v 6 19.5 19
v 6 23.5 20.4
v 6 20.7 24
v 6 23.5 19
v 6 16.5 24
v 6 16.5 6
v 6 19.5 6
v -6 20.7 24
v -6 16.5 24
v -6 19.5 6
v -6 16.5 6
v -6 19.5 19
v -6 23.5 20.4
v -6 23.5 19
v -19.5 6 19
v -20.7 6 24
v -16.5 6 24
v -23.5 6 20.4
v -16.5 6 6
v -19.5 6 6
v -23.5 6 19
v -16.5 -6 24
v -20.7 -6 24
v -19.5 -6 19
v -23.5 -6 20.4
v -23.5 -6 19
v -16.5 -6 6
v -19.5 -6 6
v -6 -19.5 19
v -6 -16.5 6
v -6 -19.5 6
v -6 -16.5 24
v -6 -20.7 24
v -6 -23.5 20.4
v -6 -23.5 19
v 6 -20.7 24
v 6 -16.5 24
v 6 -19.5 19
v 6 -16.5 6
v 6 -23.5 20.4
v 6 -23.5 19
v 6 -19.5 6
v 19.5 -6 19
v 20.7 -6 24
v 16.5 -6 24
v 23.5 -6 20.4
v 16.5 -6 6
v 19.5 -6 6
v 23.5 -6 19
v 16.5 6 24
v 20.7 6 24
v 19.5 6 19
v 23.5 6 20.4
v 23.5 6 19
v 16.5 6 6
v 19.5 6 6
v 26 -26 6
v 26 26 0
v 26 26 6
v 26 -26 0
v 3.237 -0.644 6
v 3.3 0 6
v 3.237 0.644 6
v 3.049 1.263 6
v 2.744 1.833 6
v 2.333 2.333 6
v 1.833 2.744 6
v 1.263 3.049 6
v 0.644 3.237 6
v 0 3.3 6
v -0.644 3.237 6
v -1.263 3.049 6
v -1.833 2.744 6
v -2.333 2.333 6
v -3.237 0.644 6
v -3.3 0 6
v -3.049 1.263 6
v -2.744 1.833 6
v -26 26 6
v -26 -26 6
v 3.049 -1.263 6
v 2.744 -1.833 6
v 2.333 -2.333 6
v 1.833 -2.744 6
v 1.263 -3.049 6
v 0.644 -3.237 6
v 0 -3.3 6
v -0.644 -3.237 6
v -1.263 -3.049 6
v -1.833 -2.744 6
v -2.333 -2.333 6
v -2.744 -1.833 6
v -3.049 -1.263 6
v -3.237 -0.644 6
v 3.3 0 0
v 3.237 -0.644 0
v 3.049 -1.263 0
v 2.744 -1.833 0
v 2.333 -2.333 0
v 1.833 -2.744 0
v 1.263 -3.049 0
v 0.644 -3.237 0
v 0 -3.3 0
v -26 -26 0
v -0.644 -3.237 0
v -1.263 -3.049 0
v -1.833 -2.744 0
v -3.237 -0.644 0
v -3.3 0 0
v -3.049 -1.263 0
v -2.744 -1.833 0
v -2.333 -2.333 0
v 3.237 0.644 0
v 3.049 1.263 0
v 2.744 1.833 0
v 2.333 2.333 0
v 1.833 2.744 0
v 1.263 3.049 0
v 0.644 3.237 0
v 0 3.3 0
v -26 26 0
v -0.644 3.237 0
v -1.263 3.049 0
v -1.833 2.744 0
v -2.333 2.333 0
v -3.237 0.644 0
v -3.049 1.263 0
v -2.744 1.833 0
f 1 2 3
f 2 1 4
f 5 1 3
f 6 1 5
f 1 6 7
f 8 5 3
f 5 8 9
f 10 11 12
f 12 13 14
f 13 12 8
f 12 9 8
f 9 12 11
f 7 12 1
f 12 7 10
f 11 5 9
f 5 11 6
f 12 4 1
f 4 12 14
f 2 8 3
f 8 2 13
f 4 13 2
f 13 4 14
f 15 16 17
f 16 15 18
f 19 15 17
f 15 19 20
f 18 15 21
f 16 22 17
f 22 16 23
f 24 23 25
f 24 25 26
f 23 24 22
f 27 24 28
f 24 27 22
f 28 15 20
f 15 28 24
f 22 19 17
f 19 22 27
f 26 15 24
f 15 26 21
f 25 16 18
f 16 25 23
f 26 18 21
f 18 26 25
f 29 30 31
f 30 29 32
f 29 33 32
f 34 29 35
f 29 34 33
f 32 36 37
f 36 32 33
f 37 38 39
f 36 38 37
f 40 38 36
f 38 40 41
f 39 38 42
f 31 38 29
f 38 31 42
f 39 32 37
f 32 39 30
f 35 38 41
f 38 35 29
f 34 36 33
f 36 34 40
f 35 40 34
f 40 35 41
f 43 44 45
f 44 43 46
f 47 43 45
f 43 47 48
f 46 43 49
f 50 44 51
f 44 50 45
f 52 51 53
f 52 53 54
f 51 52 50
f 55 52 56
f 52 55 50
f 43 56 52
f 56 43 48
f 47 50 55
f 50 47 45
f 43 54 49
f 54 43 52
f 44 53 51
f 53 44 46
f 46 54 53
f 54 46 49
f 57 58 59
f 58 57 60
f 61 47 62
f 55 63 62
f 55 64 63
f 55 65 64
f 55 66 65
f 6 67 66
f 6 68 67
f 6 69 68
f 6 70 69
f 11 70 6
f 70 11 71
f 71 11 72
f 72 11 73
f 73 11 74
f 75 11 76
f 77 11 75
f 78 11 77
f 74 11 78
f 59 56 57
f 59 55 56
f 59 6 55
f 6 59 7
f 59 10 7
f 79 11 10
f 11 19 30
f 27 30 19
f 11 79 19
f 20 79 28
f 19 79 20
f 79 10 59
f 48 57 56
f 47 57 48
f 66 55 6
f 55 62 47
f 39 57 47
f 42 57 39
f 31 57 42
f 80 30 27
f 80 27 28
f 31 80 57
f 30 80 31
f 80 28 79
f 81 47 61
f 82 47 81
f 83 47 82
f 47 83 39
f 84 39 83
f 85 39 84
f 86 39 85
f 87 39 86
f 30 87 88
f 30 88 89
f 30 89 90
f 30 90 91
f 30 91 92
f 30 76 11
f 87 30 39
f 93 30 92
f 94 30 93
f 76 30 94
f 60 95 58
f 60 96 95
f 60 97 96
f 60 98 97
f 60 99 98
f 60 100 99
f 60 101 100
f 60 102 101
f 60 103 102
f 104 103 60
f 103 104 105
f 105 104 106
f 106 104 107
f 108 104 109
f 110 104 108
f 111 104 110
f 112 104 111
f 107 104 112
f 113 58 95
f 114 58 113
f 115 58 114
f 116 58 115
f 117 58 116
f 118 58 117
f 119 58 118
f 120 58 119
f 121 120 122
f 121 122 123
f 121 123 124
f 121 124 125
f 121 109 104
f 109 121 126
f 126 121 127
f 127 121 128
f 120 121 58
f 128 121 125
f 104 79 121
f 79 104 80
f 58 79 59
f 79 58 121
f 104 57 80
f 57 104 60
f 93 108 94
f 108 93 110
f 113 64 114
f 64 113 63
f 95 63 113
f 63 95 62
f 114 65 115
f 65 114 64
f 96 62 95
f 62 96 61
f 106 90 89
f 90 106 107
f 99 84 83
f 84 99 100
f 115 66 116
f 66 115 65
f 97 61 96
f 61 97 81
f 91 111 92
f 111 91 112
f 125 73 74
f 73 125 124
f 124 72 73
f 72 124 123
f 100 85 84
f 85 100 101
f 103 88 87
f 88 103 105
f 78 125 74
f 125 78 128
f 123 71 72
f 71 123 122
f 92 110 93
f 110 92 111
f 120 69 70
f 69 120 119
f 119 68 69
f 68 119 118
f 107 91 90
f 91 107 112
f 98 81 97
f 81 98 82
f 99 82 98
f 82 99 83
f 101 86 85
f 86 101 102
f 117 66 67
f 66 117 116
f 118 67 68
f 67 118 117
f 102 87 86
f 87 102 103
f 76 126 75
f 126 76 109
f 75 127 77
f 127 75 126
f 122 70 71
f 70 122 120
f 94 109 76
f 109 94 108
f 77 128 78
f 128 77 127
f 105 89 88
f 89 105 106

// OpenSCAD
$fn = 32;

// ----------------------------------------------------------------------
// Snap-fit latch: 4 arms, 18 mm tall, 4.2 mm undercut hooks
// ----------------------------------------------------------------------

// --- parameters (mm) ---
base_d = 52;              // base plate depth
base_h = 6;               // base plate thickness
span = 36;                // distance between opposite arms
arm_t = 3;                // arm thickness
arm_d = 12;               // arm width
height = 18;              // free arm length
head_len = 4.2;           // hook reach
head_h = 5;               // hook height
lead = 1.4;               // lead-in ramp thickness
bore_d = 6.6;             // base fixing bore
top_z = 24;               // height of the arm tips above the base

arms = 4;

difference() {
  union() {
    /* base plate, centred on the arm ring */
    translate([-26, -26, 0]) cube([base_d, base_d, base_h]);
    for (a = [0 : 360 / arms : 359]) rotate([0, 0, a]) {
    /* arm, sunk 0.5 mm into the base */
    translate([-arm_d / 2, span / 2 - arm_t / 2, base_h - 0.5]) cube([arm_d, arm_t, height + 0.5]);
    /* hook: a convex hull of a tall inner block and a thin outer lip
       gives a flat undercut below and a lead-in ramp on top */
    hull() {
      translate([-arm_d / 2, span / 2 + arm_t / 2 - 0.6, top_z - head_h]) cube([arm_d, lead + 0.4, head_h]);
      translate([-arm_d / 2, span / 2 + arm_t / 2 - 0.2, top_z - head_h]) cube([arm_d, head_len, lead]);
    }
    }
  }
  translate([0, 0, -2.5]) cylinder(h = base_h + 5, d = bore_d);
}
